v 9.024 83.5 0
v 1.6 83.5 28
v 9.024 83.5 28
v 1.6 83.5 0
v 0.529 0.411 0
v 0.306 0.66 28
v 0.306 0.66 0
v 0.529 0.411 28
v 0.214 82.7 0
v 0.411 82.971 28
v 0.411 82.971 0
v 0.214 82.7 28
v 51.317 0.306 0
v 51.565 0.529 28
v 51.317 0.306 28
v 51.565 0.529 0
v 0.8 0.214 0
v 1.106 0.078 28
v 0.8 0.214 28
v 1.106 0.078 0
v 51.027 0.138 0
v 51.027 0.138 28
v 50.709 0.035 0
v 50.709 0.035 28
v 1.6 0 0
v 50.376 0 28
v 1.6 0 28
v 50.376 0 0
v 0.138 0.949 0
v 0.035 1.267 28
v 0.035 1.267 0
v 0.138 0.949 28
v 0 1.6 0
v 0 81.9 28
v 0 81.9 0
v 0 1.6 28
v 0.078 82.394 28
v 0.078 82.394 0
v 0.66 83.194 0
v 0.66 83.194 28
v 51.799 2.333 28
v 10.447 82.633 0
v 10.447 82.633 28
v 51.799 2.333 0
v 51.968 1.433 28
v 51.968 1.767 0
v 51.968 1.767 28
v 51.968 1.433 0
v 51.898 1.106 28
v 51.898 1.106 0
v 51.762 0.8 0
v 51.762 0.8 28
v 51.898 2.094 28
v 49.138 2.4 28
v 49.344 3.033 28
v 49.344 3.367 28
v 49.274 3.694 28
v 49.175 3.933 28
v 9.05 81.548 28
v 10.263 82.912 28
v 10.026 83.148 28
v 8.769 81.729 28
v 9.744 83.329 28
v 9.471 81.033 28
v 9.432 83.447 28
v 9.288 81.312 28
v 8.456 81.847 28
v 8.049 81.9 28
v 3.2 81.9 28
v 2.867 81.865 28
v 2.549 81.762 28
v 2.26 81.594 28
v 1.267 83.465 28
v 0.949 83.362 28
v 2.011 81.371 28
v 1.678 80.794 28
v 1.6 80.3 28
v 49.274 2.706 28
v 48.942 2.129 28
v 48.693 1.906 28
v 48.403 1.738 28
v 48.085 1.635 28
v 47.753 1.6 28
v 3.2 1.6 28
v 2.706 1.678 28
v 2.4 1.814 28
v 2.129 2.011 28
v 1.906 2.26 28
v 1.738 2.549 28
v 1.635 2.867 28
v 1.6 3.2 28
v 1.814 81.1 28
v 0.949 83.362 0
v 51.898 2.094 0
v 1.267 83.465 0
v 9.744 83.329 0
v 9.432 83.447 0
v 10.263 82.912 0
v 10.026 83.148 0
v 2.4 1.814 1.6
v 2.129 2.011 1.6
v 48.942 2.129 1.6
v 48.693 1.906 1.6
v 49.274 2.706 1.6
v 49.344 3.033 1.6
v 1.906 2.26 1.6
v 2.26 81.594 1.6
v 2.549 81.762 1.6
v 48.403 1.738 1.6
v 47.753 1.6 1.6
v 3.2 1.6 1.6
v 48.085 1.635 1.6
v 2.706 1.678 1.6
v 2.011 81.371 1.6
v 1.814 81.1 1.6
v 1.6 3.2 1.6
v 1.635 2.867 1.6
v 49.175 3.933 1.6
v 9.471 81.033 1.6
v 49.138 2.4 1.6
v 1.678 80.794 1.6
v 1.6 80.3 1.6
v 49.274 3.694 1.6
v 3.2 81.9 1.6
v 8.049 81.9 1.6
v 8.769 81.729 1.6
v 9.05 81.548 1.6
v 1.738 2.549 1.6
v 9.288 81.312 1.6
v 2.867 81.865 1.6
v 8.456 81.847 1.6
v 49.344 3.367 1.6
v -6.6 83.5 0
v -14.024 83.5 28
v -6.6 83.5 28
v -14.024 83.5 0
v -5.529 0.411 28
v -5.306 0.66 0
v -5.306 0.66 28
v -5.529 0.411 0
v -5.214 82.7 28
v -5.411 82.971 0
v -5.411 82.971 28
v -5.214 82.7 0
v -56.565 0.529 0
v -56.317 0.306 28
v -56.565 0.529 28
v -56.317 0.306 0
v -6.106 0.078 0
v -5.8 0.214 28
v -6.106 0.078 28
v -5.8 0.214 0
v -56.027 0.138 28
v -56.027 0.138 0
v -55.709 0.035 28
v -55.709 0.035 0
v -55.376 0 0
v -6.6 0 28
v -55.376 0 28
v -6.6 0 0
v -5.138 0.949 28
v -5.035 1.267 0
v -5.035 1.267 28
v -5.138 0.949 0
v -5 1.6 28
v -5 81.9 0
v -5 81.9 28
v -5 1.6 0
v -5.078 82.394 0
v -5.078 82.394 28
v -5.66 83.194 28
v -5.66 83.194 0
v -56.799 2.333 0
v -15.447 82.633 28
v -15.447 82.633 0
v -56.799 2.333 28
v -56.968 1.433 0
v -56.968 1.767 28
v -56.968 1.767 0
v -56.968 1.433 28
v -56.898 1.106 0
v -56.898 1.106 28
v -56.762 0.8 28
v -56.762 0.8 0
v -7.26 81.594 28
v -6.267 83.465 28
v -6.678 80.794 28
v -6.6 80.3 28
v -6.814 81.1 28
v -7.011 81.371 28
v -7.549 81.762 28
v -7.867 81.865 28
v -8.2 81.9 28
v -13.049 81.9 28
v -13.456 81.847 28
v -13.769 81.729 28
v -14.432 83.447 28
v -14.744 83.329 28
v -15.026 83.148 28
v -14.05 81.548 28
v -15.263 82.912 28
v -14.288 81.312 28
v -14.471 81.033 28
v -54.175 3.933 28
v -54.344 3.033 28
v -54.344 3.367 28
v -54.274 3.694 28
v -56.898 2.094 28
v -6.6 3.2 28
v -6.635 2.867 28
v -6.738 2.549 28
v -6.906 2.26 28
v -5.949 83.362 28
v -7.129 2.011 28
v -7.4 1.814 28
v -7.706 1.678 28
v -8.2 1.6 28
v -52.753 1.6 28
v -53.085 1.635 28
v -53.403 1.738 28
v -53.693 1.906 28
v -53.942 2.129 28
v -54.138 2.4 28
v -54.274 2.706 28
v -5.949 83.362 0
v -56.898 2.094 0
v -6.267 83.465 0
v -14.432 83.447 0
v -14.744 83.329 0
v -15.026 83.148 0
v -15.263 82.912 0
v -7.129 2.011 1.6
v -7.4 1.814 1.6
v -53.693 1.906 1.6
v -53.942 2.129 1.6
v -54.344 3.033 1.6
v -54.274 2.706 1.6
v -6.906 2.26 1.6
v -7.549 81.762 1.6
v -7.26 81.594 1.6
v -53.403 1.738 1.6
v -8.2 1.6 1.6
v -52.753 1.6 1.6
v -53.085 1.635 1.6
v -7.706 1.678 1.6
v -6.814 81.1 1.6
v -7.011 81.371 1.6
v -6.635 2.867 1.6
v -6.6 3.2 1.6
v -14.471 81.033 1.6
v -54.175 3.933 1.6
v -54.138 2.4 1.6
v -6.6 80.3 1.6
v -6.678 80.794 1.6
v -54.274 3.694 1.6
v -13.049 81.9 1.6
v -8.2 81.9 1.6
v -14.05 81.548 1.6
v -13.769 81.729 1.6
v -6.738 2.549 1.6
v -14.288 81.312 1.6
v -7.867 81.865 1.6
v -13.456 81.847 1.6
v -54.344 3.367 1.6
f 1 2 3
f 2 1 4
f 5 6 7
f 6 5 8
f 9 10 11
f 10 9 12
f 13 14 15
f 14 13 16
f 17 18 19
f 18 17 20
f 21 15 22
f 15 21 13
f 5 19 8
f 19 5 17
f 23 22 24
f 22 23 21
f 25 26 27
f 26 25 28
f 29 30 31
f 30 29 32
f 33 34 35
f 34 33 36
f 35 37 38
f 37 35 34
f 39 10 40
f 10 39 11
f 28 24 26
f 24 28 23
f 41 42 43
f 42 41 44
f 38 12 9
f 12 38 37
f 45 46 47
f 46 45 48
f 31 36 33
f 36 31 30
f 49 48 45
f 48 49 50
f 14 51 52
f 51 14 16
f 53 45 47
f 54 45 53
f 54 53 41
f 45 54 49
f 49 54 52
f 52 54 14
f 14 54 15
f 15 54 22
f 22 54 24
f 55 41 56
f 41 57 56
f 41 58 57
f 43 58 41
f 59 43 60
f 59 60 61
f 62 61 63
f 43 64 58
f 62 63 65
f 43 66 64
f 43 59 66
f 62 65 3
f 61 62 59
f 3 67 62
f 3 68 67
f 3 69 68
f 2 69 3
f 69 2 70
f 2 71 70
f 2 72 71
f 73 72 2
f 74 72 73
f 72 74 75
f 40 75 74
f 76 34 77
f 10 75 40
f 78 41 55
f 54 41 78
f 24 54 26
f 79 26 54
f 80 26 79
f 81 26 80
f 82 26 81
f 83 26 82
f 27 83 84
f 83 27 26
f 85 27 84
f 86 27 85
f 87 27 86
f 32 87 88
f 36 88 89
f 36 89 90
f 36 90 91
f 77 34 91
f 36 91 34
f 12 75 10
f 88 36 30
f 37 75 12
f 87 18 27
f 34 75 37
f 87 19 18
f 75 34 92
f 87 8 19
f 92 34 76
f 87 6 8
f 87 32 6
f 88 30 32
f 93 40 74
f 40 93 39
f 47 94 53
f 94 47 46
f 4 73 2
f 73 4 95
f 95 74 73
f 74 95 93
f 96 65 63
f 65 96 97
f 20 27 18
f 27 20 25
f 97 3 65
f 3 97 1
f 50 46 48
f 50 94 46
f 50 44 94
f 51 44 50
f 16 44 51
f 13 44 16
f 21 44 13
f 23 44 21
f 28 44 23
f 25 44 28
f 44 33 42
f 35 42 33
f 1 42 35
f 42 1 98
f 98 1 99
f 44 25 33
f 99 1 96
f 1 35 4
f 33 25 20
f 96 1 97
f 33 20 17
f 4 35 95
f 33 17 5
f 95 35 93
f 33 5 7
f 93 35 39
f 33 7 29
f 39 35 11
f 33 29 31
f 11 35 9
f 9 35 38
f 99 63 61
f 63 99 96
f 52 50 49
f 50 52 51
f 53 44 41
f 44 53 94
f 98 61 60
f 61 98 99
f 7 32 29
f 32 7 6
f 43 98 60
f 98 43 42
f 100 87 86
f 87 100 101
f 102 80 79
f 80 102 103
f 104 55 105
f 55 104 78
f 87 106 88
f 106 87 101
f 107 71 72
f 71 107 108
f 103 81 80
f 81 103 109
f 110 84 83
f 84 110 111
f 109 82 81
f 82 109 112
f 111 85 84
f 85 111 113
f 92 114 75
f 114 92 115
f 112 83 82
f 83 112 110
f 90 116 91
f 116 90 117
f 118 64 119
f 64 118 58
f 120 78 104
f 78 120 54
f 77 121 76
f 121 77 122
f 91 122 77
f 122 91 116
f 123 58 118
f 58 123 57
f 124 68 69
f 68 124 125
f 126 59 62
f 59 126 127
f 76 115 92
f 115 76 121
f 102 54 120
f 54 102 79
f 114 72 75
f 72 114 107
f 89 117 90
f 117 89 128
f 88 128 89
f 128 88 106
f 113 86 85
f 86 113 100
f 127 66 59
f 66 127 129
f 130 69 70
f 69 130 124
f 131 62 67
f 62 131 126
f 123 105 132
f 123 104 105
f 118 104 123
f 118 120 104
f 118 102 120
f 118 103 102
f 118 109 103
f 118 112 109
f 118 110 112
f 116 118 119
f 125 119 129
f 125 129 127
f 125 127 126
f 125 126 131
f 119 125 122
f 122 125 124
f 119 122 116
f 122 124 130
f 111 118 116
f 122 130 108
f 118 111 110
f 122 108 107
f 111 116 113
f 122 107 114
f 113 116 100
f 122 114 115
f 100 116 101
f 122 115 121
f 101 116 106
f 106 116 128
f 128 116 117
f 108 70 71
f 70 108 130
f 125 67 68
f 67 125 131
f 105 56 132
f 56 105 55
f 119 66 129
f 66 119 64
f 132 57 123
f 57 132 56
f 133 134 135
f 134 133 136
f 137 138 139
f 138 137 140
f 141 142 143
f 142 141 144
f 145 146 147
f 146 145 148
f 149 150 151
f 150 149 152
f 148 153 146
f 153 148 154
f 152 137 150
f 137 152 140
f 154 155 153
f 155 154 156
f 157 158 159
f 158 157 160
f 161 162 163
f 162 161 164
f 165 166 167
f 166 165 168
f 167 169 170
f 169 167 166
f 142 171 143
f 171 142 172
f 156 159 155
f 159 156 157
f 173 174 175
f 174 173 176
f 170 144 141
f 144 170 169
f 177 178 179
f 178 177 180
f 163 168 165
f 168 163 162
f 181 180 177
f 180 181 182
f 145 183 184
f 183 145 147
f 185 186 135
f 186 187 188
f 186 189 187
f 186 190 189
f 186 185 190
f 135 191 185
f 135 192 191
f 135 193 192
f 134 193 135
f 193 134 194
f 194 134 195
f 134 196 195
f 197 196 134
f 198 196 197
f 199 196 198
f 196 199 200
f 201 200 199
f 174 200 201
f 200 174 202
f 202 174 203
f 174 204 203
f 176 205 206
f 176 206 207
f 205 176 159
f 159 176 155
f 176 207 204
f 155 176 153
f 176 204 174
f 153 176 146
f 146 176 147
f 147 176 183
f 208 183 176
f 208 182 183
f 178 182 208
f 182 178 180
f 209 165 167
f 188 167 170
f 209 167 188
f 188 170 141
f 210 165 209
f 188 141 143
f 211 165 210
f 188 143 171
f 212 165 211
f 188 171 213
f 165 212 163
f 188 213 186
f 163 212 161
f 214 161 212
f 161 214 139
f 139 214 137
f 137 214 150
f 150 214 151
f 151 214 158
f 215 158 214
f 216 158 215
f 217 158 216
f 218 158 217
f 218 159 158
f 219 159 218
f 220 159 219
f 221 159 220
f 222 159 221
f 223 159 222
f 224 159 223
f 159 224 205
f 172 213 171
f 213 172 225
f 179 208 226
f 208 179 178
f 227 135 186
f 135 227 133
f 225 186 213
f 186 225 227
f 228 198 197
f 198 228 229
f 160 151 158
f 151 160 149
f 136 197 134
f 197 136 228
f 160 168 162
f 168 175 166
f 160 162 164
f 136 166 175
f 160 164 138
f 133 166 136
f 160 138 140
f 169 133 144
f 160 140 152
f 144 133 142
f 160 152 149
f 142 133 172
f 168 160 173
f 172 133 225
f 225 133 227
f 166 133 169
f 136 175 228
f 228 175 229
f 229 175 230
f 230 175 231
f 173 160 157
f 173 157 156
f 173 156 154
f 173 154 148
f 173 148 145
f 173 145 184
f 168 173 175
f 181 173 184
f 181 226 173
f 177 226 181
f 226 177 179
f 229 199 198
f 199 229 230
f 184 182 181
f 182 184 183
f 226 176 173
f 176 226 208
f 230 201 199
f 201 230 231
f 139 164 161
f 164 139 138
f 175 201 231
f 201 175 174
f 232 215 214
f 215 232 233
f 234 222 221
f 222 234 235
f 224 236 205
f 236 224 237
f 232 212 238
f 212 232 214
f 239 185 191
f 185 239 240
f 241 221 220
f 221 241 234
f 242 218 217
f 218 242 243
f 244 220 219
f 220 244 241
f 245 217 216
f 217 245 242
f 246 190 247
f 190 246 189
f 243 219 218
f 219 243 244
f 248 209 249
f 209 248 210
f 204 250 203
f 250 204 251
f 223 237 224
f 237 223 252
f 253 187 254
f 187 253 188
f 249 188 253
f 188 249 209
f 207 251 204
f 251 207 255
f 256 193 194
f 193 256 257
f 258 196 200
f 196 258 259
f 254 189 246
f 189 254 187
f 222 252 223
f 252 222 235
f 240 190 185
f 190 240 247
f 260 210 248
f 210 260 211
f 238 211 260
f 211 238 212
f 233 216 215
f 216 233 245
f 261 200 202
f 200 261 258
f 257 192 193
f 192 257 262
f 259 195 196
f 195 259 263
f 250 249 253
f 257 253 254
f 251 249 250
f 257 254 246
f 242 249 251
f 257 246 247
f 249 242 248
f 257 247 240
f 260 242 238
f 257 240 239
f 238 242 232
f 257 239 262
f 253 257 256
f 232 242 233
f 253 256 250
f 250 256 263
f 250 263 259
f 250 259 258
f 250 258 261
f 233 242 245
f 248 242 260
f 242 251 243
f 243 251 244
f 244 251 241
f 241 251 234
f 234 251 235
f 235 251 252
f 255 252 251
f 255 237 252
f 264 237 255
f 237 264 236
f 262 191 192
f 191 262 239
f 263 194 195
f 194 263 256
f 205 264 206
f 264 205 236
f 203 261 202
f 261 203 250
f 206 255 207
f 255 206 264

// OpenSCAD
$fn = 30;

module MiscBase(){
    offset (1.6) offset (-1.6) polygon([[0,0],[0,83.5],[10,83.5],[53,0]]);
}

module MiscBox(){
difference(){
  linear_extrude (height =28)  MiscBase();
  translate([0,0,1.6]) linear_extrude (height =28) offset (1.6) offset (-3.2) MiscBase();
}
}

MiscBox();

translate([-5,0,0]) mirror() MiscBox();
